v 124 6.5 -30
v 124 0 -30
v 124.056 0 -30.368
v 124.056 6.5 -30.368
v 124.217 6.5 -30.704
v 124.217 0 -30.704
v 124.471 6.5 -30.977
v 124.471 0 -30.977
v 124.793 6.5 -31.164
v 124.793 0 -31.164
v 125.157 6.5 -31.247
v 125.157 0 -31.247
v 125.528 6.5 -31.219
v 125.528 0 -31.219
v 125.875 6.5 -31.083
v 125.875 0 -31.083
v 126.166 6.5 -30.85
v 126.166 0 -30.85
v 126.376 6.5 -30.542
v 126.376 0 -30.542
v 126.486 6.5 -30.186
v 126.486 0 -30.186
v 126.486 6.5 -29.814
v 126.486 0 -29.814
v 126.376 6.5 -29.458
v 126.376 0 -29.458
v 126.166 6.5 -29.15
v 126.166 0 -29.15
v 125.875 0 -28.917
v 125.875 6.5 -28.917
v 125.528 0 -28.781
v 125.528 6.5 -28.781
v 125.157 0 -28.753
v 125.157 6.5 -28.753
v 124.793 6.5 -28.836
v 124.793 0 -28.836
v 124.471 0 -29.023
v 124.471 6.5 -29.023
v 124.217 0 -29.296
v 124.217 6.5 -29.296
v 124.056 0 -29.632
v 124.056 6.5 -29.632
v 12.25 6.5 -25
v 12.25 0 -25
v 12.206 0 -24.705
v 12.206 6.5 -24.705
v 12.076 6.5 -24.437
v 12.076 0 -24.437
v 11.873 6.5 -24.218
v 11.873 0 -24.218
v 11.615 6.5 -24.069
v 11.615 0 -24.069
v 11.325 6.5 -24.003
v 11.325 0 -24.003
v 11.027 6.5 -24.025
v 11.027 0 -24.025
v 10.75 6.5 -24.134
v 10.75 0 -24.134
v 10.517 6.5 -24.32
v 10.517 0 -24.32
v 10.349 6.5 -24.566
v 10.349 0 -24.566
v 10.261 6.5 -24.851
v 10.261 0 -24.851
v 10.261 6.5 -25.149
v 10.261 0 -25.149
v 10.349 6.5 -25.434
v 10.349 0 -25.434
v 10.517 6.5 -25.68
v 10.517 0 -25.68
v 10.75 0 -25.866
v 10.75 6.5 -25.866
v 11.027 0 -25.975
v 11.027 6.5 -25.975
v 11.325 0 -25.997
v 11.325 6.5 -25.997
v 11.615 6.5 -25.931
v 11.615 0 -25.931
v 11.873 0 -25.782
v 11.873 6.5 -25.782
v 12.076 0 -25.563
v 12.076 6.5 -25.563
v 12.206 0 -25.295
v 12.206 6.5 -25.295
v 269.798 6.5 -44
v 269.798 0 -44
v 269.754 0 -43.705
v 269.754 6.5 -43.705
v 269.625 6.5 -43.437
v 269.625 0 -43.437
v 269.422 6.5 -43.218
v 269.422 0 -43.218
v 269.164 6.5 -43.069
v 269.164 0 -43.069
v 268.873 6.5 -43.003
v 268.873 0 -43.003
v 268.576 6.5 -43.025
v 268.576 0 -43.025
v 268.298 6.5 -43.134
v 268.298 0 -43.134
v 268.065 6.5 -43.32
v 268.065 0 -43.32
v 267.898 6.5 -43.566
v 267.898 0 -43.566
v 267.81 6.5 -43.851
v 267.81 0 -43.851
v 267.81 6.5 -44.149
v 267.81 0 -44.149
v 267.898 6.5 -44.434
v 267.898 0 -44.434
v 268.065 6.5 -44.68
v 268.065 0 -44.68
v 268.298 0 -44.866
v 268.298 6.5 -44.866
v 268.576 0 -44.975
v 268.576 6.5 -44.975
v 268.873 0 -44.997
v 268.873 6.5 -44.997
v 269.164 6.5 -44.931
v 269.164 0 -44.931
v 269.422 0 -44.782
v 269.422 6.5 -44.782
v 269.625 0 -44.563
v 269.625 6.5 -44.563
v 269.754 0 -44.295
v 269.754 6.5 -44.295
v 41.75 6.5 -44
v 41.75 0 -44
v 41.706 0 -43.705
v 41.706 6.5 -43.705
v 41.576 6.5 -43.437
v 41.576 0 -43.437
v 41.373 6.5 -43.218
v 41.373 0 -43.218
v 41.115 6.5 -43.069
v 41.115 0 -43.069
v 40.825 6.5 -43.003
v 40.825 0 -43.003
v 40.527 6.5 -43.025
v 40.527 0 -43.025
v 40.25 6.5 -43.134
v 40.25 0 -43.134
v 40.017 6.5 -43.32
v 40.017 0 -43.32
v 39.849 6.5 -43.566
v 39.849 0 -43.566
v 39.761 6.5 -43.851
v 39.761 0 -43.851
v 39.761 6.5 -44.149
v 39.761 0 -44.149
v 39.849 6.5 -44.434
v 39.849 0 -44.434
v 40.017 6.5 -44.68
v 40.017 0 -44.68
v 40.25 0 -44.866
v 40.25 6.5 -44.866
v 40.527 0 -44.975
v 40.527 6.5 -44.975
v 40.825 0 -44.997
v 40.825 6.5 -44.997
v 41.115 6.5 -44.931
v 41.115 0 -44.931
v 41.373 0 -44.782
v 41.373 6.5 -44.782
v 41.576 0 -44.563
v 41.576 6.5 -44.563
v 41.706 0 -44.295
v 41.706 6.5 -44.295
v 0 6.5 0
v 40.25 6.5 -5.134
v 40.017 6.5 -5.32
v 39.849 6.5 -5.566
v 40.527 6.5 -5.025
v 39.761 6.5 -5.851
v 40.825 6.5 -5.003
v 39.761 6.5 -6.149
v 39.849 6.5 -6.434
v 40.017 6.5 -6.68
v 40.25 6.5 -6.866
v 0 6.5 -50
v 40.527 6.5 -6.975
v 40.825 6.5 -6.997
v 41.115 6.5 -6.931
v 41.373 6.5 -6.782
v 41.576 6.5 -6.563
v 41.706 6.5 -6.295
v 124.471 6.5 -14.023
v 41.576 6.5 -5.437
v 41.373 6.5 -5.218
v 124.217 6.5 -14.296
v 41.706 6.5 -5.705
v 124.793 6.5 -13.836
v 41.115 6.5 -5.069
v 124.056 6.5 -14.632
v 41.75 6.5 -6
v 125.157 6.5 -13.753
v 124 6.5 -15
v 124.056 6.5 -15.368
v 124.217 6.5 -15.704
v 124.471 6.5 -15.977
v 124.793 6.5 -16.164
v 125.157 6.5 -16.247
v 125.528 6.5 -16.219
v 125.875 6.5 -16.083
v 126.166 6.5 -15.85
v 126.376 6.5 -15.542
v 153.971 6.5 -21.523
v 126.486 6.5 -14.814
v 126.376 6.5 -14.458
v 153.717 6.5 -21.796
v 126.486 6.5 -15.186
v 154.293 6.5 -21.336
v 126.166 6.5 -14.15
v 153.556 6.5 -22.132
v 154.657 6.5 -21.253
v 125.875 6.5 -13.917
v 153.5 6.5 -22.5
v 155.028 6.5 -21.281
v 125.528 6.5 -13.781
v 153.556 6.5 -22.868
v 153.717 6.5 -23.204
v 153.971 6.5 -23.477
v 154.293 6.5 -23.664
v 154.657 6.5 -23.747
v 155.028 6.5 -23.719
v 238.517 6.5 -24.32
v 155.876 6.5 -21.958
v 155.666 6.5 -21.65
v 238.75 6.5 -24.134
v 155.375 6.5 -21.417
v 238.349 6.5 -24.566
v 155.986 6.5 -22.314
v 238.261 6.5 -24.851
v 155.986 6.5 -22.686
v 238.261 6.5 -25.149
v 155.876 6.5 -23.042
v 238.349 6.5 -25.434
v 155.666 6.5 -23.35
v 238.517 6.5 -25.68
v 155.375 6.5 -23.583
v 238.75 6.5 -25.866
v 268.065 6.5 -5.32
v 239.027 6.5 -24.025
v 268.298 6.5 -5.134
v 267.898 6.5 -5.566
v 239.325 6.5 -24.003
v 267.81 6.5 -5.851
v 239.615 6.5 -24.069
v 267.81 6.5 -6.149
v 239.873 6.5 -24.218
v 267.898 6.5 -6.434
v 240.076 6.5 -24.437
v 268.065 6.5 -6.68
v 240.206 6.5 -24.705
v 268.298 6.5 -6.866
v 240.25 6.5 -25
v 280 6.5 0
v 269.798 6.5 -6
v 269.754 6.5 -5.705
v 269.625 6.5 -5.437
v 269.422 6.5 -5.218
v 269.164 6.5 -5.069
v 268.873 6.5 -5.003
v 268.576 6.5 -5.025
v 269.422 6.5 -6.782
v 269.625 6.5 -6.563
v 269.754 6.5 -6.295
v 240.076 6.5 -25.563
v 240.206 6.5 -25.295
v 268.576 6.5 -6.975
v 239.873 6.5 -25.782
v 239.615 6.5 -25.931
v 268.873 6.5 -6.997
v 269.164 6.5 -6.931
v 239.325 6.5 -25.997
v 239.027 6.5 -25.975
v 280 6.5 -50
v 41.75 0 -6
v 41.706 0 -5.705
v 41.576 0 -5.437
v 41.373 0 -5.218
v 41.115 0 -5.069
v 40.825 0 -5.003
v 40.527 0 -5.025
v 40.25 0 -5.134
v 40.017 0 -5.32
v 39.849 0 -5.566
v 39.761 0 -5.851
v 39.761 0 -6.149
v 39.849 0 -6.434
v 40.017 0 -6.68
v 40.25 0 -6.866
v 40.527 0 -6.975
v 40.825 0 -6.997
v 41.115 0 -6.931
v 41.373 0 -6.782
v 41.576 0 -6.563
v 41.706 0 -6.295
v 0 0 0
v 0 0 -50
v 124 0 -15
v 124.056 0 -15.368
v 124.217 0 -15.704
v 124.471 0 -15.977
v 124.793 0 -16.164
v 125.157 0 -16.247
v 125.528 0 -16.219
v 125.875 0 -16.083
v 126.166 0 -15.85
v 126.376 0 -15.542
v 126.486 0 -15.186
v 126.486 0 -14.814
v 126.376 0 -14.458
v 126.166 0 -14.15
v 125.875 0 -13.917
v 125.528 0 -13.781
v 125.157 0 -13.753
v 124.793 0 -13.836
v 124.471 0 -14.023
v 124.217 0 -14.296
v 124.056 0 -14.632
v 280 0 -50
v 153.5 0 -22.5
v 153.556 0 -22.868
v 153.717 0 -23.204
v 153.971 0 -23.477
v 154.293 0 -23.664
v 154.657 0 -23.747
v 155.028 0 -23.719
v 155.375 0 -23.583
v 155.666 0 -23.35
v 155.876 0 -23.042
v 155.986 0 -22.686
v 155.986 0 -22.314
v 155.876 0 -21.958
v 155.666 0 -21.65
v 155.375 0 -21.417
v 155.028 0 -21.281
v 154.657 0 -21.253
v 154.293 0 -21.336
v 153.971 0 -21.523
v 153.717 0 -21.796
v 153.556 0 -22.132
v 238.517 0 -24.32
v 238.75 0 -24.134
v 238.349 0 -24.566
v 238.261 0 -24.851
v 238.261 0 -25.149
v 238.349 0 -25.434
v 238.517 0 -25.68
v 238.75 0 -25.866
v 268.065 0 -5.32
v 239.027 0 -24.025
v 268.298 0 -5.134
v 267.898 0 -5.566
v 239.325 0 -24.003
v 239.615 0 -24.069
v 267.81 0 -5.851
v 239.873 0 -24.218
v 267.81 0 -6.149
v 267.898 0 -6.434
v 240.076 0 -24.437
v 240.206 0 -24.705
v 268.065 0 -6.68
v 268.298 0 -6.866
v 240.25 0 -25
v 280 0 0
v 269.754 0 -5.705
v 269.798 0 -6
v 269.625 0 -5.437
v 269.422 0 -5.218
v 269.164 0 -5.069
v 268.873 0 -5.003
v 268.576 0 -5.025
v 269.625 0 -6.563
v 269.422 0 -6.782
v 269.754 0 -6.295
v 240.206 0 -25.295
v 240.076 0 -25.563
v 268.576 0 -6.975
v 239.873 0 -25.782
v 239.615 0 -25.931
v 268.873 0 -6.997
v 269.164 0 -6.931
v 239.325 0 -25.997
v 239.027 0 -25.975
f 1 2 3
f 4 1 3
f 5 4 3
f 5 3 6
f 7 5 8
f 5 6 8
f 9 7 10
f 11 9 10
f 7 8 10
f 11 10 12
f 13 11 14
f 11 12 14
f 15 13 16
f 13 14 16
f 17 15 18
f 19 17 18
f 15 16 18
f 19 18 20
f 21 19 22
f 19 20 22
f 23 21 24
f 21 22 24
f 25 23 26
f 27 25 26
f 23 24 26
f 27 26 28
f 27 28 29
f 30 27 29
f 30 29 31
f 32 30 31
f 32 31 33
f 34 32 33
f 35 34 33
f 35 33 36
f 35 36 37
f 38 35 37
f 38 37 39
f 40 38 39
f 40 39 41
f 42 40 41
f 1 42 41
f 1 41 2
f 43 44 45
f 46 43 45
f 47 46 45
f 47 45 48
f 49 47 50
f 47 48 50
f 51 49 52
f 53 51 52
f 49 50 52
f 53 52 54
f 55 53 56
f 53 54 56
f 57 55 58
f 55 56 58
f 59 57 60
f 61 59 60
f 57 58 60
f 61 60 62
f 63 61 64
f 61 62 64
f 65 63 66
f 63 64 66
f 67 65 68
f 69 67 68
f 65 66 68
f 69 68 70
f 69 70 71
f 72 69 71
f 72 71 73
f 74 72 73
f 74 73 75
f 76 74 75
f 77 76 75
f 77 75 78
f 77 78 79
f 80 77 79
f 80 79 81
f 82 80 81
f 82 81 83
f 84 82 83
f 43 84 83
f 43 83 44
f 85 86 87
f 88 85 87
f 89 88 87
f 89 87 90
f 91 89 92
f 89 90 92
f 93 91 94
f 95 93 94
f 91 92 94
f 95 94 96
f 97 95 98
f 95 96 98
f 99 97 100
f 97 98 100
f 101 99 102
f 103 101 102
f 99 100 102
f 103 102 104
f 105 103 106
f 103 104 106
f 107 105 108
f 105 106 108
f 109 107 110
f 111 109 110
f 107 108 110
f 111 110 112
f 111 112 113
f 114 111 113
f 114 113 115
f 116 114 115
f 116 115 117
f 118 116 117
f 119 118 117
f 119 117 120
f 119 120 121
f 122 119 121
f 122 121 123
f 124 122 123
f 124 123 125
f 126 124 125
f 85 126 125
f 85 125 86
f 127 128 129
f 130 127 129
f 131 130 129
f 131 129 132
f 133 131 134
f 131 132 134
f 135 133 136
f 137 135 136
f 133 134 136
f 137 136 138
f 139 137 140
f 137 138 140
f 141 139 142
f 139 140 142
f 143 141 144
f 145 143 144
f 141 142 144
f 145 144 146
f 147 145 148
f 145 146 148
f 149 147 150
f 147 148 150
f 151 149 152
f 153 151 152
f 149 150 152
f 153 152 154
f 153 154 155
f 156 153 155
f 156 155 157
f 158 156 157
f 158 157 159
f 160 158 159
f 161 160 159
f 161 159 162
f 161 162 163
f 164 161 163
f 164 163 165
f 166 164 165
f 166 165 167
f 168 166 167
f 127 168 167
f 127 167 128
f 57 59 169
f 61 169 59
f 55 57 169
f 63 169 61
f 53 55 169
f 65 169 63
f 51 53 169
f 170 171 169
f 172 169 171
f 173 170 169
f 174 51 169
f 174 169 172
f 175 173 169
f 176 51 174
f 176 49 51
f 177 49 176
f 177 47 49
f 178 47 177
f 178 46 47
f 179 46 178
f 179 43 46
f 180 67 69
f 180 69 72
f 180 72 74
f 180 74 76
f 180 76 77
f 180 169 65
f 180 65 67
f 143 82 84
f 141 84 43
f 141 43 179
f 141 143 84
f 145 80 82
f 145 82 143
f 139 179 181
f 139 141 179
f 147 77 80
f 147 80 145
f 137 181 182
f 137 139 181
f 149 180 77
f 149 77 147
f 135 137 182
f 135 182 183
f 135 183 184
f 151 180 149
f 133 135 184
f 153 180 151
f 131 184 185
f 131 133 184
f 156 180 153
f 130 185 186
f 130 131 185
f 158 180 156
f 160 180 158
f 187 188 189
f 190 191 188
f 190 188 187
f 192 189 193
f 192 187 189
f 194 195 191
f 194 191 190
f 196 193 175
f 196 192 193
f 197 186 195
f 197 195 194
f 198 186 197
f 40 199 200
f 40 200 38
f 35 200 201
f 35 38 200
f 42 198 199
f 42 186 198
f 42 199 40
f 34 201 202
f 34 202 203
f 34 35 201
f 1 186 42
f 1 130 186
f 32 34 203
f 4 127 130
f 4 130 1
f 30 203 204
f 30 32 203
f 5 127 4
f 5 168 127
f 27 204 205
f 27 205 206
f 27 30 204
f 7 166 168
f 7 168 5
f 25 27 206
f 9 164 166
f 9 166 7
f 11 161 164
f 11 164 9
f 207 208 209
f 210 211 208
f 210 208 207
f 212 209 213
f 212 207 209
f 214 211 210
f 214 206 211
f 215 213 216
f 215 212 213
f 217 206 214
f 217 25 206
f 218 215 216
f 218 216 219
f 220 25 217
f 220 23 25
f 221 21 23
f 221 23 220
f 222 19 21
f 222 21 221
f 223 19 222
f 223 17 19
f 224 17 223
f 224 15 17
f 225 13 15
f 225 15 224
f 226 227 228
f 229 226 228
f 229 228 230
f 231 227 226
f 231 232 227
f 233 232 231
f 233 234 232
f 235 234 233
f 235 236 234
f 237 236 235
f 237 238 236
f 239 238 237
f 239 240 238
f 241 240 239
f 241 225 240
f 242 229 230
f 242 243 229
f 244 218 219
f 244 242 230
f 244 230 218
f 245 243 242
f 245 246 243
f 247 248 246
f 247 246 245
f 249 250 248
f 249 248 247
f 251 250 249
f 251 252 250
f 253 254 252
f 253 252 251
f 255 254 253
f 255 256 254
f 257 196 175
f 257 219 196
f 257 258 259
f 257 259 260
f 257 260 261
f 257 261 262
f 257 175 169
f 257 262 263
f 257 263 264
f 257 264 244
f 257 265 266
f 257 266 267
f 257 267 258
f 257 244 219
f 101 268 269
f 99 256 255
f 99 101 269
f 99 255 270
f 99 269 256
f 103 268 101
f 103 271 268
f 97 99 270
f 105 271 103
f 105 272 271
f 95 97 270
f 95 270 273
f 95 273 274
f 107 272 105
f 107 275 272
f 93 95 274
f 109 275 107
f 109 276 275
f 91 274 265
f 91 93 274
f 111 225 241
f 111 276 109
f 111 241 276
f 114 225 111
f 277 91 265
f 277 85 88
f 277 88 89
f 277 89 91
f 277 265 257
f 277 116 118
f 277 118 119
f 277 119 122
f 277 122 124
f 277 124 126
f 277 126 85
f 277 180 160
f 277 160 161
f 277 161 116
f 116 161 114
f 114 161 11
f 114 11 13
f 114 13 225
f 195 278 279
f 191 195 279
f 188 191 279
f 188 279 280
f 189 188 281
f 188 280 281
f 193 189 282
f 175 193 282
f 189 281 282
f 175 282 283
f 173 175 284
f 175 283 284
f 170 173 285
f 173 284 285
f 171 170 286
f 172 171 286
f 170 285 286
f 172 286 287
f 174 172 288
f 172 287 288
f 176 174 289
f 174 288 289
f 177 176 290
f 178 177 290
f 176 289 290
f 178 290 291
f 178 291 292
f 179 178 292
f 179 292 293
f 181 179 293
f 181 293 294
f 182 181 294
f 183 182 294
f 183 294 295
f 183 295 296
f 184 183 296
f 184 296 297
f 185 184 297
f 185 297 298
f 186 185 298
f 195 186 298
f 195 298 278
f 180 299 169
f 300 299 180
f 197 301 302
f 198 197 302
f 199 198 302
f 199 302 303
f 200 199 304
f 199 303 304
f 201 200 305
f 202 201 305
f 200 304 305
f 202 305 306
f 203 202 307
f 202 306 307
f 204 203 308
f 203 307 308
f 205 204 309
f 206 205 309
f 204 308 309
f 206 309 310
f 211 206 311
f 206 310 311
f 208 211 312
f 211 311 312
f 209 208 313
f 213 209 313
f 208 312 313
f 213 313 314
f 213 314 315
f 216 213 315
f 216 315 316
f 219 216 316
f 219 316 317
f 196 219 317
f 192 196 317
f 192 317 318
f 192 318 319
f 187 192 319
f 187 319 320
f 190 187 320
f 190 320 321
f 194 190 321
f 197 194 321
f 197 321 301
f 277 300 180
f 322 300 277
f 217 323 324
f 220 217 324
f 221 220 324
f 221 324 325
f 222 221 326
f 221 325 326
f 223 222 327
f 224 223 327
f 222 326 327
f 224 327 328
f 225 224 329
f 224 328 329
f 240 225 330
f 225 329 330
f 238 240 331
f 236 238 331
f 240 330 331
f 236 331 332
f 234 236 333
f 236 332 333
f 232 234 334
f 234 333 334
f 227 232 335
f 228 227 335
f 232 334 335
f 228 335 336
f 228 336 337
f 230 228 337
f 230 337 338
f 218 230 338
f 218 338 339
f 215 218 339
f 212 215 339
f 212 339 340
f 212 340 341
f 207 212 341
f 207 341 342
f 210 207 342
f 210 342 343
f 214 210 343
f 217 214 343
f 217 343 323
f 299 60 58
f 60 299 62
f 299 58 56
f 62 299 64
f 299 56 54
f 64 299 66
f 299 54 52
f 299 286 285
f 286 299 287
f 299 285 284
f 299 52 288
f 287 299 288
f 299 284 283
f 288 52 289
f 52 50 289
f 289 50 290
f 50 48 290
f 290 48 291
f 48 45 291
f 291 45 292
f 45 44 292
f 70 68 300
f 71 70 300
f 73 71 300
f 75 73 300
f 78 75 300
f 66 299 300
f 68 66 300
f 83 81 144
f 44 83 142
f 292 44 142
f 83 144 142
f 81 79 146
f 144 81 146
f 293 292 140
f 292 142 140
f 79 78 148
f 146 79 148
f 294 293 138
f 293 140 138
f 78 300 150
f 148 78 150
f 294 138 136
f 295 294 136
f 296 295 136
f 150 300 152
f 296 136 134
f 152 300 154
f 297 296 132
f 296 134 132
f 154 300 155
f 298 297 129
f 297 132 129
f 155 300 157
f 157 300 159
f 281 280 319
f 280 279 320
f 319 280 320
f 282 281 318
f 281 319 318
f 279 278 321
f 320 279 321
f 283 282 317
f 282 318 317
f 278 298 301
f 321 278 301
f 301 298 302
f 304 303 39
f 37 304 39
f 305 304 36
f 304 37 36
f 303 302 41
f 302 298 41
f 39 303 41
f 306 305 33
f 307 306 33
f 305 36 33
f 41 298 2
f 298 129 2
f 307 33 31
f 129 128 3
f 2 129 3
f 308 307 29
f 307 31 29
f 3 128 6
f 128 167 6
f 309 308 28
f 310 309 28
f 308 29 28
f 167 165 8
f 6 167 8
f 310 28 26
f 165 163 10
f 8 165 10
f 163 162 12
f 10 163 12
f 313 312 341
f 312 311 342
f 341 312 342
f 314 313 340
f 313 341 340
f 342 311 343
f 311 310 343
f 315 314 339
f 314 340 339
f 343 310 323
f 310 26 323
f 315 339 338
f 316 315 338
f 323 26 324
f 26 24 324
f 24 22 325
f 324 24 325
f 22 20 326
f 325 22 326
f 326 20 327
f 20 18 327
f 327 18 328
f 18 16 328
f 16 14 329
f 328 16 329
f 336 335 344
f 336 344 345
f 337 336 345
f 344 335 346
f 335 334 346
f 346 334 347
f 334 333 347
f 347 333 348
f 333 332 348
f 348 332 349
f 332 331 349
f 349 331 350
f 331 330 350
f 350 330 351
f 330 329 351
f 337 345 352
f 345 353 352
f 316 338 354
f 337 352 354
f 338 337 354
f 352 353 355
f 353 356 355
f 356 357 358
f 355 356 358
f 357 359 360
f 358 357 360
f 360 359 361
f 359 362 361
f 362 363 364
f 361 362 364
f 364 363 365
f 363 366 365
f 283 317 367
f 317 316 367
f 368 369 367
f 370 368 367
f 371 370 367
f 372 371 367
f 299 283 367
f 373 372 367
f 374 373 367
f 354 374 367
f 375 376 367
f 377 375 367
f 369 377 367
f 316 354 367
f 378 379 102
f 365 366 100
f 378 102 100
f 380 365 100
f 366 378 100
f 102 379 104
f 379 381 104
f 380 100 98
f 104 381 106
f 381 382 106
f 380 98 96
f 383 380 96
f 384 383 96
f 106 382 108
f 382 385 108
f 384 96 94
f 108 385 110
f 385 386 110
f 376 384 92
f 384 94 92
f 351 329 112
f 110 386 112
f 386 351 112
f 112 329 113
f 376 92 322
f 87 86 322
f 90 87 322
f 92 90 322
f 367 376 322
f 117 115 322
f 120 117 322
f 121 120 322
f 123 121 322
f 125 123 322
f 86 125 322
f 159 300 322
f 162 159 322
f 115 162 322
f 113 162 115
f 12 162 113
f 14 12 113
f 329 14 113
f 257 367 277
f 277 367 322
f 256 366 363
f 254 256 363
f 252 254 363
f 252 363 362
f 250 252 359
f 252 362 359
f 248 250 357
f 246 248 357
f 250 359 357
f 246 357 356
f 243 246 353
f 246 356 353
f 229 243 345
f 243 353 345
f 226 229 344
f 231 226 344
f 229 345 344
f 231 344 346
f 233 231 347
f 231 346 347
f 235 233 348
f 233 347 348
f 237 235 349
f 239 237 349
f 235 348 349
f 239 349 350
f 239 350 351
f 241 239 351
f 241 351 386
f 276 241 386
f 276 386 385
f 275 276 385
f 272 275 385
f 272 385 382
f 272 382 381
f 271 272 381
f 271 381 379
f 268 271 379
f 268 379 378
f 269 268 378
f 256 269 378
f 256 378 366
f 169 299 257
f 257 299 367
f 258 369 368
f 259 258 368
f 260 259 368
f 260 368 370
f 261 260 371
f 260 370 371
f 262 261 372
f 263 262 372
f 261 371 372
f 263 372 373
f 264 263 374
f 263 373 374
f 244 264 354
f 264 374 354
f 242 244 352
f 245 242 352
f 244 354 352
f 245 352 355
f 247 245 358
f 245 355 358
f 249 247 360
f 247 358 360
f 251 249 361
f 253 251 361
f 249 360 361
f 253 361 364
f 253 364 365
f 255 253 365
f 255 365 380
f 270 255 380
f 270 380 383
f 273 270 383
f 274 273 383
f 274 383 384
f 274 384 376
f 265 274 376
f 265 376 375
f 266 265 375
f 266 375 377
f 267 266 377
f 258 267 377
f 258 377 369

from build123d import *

# Parameters (mm, degrees)
SKETCH1_W           = 280
SKETCH1_H           = 50
BOSS_EXTRUDE1_DEPTH = 6.5
SKETCH2_R           = 1.25
CUT_EXTRUDE1_DEPTH  = 7.5
SKETCH3_R           = 1
CUT_EXTRUDE2_DEPTH  = 7.5


with BuildPart() as part:
    # Sketch1 → Boss-Extrude1 (new body)
    with BuildSketch(Plane(origin=(0, 0, 0), x_dir=(1, 0, 0), z_dir=(0, 1, 0))):
        with Locations((140, 25)):
            Rectangle(SKETCH1_W, SKETCH1_H)
    extrude(amount=BOSS_EXTRUDE1_DEPTH)

    # Sketch2 → Cut-Extrude1 (cut, through all)
    with BuildSketch(Plane(origin=(0, 0, 0), x_dir=(-1, 0, 0), z_dir=(0, -1, 0))):
        with Locations((-125.25, 30)):
            Circle(SKETCH2_R)
        with Locations((-125.25, 15)):
            Circle(SKETCH2_R)
        with Locations((-154.75, 22.5)):
            Circle(SKETCH2_R)
    extrude(amount=-CUT_EXTRUDE1_DEPTH, mode=Mode.SUBTRACT)

    # Sketch3 → Cut-Extrude2 (cut, through all)
    with BuildSketch(Plane.XZ):
        with Locations((268.798469713, -44)):
            Circle(SKETCH3_R)
        with Locations((268.798469713, -6)):
            Circle(SKETCH3_R)
        with Locations((239.25, -25)):
            Circle(SKETCH3_R)
        with Locations((11.25, -25)):
            Circle(SKETCH3_R)
        with Locations((40.75, -6)):
            Circle(SKETCH3_R)
        with Locations((40.75, -44)):
            Circle(SKETCH3_R)
    extrude(amount=-CUT_EXTRUDE2_DEPTH, mode=Mode.SUBTRACT)


solid = part.part
